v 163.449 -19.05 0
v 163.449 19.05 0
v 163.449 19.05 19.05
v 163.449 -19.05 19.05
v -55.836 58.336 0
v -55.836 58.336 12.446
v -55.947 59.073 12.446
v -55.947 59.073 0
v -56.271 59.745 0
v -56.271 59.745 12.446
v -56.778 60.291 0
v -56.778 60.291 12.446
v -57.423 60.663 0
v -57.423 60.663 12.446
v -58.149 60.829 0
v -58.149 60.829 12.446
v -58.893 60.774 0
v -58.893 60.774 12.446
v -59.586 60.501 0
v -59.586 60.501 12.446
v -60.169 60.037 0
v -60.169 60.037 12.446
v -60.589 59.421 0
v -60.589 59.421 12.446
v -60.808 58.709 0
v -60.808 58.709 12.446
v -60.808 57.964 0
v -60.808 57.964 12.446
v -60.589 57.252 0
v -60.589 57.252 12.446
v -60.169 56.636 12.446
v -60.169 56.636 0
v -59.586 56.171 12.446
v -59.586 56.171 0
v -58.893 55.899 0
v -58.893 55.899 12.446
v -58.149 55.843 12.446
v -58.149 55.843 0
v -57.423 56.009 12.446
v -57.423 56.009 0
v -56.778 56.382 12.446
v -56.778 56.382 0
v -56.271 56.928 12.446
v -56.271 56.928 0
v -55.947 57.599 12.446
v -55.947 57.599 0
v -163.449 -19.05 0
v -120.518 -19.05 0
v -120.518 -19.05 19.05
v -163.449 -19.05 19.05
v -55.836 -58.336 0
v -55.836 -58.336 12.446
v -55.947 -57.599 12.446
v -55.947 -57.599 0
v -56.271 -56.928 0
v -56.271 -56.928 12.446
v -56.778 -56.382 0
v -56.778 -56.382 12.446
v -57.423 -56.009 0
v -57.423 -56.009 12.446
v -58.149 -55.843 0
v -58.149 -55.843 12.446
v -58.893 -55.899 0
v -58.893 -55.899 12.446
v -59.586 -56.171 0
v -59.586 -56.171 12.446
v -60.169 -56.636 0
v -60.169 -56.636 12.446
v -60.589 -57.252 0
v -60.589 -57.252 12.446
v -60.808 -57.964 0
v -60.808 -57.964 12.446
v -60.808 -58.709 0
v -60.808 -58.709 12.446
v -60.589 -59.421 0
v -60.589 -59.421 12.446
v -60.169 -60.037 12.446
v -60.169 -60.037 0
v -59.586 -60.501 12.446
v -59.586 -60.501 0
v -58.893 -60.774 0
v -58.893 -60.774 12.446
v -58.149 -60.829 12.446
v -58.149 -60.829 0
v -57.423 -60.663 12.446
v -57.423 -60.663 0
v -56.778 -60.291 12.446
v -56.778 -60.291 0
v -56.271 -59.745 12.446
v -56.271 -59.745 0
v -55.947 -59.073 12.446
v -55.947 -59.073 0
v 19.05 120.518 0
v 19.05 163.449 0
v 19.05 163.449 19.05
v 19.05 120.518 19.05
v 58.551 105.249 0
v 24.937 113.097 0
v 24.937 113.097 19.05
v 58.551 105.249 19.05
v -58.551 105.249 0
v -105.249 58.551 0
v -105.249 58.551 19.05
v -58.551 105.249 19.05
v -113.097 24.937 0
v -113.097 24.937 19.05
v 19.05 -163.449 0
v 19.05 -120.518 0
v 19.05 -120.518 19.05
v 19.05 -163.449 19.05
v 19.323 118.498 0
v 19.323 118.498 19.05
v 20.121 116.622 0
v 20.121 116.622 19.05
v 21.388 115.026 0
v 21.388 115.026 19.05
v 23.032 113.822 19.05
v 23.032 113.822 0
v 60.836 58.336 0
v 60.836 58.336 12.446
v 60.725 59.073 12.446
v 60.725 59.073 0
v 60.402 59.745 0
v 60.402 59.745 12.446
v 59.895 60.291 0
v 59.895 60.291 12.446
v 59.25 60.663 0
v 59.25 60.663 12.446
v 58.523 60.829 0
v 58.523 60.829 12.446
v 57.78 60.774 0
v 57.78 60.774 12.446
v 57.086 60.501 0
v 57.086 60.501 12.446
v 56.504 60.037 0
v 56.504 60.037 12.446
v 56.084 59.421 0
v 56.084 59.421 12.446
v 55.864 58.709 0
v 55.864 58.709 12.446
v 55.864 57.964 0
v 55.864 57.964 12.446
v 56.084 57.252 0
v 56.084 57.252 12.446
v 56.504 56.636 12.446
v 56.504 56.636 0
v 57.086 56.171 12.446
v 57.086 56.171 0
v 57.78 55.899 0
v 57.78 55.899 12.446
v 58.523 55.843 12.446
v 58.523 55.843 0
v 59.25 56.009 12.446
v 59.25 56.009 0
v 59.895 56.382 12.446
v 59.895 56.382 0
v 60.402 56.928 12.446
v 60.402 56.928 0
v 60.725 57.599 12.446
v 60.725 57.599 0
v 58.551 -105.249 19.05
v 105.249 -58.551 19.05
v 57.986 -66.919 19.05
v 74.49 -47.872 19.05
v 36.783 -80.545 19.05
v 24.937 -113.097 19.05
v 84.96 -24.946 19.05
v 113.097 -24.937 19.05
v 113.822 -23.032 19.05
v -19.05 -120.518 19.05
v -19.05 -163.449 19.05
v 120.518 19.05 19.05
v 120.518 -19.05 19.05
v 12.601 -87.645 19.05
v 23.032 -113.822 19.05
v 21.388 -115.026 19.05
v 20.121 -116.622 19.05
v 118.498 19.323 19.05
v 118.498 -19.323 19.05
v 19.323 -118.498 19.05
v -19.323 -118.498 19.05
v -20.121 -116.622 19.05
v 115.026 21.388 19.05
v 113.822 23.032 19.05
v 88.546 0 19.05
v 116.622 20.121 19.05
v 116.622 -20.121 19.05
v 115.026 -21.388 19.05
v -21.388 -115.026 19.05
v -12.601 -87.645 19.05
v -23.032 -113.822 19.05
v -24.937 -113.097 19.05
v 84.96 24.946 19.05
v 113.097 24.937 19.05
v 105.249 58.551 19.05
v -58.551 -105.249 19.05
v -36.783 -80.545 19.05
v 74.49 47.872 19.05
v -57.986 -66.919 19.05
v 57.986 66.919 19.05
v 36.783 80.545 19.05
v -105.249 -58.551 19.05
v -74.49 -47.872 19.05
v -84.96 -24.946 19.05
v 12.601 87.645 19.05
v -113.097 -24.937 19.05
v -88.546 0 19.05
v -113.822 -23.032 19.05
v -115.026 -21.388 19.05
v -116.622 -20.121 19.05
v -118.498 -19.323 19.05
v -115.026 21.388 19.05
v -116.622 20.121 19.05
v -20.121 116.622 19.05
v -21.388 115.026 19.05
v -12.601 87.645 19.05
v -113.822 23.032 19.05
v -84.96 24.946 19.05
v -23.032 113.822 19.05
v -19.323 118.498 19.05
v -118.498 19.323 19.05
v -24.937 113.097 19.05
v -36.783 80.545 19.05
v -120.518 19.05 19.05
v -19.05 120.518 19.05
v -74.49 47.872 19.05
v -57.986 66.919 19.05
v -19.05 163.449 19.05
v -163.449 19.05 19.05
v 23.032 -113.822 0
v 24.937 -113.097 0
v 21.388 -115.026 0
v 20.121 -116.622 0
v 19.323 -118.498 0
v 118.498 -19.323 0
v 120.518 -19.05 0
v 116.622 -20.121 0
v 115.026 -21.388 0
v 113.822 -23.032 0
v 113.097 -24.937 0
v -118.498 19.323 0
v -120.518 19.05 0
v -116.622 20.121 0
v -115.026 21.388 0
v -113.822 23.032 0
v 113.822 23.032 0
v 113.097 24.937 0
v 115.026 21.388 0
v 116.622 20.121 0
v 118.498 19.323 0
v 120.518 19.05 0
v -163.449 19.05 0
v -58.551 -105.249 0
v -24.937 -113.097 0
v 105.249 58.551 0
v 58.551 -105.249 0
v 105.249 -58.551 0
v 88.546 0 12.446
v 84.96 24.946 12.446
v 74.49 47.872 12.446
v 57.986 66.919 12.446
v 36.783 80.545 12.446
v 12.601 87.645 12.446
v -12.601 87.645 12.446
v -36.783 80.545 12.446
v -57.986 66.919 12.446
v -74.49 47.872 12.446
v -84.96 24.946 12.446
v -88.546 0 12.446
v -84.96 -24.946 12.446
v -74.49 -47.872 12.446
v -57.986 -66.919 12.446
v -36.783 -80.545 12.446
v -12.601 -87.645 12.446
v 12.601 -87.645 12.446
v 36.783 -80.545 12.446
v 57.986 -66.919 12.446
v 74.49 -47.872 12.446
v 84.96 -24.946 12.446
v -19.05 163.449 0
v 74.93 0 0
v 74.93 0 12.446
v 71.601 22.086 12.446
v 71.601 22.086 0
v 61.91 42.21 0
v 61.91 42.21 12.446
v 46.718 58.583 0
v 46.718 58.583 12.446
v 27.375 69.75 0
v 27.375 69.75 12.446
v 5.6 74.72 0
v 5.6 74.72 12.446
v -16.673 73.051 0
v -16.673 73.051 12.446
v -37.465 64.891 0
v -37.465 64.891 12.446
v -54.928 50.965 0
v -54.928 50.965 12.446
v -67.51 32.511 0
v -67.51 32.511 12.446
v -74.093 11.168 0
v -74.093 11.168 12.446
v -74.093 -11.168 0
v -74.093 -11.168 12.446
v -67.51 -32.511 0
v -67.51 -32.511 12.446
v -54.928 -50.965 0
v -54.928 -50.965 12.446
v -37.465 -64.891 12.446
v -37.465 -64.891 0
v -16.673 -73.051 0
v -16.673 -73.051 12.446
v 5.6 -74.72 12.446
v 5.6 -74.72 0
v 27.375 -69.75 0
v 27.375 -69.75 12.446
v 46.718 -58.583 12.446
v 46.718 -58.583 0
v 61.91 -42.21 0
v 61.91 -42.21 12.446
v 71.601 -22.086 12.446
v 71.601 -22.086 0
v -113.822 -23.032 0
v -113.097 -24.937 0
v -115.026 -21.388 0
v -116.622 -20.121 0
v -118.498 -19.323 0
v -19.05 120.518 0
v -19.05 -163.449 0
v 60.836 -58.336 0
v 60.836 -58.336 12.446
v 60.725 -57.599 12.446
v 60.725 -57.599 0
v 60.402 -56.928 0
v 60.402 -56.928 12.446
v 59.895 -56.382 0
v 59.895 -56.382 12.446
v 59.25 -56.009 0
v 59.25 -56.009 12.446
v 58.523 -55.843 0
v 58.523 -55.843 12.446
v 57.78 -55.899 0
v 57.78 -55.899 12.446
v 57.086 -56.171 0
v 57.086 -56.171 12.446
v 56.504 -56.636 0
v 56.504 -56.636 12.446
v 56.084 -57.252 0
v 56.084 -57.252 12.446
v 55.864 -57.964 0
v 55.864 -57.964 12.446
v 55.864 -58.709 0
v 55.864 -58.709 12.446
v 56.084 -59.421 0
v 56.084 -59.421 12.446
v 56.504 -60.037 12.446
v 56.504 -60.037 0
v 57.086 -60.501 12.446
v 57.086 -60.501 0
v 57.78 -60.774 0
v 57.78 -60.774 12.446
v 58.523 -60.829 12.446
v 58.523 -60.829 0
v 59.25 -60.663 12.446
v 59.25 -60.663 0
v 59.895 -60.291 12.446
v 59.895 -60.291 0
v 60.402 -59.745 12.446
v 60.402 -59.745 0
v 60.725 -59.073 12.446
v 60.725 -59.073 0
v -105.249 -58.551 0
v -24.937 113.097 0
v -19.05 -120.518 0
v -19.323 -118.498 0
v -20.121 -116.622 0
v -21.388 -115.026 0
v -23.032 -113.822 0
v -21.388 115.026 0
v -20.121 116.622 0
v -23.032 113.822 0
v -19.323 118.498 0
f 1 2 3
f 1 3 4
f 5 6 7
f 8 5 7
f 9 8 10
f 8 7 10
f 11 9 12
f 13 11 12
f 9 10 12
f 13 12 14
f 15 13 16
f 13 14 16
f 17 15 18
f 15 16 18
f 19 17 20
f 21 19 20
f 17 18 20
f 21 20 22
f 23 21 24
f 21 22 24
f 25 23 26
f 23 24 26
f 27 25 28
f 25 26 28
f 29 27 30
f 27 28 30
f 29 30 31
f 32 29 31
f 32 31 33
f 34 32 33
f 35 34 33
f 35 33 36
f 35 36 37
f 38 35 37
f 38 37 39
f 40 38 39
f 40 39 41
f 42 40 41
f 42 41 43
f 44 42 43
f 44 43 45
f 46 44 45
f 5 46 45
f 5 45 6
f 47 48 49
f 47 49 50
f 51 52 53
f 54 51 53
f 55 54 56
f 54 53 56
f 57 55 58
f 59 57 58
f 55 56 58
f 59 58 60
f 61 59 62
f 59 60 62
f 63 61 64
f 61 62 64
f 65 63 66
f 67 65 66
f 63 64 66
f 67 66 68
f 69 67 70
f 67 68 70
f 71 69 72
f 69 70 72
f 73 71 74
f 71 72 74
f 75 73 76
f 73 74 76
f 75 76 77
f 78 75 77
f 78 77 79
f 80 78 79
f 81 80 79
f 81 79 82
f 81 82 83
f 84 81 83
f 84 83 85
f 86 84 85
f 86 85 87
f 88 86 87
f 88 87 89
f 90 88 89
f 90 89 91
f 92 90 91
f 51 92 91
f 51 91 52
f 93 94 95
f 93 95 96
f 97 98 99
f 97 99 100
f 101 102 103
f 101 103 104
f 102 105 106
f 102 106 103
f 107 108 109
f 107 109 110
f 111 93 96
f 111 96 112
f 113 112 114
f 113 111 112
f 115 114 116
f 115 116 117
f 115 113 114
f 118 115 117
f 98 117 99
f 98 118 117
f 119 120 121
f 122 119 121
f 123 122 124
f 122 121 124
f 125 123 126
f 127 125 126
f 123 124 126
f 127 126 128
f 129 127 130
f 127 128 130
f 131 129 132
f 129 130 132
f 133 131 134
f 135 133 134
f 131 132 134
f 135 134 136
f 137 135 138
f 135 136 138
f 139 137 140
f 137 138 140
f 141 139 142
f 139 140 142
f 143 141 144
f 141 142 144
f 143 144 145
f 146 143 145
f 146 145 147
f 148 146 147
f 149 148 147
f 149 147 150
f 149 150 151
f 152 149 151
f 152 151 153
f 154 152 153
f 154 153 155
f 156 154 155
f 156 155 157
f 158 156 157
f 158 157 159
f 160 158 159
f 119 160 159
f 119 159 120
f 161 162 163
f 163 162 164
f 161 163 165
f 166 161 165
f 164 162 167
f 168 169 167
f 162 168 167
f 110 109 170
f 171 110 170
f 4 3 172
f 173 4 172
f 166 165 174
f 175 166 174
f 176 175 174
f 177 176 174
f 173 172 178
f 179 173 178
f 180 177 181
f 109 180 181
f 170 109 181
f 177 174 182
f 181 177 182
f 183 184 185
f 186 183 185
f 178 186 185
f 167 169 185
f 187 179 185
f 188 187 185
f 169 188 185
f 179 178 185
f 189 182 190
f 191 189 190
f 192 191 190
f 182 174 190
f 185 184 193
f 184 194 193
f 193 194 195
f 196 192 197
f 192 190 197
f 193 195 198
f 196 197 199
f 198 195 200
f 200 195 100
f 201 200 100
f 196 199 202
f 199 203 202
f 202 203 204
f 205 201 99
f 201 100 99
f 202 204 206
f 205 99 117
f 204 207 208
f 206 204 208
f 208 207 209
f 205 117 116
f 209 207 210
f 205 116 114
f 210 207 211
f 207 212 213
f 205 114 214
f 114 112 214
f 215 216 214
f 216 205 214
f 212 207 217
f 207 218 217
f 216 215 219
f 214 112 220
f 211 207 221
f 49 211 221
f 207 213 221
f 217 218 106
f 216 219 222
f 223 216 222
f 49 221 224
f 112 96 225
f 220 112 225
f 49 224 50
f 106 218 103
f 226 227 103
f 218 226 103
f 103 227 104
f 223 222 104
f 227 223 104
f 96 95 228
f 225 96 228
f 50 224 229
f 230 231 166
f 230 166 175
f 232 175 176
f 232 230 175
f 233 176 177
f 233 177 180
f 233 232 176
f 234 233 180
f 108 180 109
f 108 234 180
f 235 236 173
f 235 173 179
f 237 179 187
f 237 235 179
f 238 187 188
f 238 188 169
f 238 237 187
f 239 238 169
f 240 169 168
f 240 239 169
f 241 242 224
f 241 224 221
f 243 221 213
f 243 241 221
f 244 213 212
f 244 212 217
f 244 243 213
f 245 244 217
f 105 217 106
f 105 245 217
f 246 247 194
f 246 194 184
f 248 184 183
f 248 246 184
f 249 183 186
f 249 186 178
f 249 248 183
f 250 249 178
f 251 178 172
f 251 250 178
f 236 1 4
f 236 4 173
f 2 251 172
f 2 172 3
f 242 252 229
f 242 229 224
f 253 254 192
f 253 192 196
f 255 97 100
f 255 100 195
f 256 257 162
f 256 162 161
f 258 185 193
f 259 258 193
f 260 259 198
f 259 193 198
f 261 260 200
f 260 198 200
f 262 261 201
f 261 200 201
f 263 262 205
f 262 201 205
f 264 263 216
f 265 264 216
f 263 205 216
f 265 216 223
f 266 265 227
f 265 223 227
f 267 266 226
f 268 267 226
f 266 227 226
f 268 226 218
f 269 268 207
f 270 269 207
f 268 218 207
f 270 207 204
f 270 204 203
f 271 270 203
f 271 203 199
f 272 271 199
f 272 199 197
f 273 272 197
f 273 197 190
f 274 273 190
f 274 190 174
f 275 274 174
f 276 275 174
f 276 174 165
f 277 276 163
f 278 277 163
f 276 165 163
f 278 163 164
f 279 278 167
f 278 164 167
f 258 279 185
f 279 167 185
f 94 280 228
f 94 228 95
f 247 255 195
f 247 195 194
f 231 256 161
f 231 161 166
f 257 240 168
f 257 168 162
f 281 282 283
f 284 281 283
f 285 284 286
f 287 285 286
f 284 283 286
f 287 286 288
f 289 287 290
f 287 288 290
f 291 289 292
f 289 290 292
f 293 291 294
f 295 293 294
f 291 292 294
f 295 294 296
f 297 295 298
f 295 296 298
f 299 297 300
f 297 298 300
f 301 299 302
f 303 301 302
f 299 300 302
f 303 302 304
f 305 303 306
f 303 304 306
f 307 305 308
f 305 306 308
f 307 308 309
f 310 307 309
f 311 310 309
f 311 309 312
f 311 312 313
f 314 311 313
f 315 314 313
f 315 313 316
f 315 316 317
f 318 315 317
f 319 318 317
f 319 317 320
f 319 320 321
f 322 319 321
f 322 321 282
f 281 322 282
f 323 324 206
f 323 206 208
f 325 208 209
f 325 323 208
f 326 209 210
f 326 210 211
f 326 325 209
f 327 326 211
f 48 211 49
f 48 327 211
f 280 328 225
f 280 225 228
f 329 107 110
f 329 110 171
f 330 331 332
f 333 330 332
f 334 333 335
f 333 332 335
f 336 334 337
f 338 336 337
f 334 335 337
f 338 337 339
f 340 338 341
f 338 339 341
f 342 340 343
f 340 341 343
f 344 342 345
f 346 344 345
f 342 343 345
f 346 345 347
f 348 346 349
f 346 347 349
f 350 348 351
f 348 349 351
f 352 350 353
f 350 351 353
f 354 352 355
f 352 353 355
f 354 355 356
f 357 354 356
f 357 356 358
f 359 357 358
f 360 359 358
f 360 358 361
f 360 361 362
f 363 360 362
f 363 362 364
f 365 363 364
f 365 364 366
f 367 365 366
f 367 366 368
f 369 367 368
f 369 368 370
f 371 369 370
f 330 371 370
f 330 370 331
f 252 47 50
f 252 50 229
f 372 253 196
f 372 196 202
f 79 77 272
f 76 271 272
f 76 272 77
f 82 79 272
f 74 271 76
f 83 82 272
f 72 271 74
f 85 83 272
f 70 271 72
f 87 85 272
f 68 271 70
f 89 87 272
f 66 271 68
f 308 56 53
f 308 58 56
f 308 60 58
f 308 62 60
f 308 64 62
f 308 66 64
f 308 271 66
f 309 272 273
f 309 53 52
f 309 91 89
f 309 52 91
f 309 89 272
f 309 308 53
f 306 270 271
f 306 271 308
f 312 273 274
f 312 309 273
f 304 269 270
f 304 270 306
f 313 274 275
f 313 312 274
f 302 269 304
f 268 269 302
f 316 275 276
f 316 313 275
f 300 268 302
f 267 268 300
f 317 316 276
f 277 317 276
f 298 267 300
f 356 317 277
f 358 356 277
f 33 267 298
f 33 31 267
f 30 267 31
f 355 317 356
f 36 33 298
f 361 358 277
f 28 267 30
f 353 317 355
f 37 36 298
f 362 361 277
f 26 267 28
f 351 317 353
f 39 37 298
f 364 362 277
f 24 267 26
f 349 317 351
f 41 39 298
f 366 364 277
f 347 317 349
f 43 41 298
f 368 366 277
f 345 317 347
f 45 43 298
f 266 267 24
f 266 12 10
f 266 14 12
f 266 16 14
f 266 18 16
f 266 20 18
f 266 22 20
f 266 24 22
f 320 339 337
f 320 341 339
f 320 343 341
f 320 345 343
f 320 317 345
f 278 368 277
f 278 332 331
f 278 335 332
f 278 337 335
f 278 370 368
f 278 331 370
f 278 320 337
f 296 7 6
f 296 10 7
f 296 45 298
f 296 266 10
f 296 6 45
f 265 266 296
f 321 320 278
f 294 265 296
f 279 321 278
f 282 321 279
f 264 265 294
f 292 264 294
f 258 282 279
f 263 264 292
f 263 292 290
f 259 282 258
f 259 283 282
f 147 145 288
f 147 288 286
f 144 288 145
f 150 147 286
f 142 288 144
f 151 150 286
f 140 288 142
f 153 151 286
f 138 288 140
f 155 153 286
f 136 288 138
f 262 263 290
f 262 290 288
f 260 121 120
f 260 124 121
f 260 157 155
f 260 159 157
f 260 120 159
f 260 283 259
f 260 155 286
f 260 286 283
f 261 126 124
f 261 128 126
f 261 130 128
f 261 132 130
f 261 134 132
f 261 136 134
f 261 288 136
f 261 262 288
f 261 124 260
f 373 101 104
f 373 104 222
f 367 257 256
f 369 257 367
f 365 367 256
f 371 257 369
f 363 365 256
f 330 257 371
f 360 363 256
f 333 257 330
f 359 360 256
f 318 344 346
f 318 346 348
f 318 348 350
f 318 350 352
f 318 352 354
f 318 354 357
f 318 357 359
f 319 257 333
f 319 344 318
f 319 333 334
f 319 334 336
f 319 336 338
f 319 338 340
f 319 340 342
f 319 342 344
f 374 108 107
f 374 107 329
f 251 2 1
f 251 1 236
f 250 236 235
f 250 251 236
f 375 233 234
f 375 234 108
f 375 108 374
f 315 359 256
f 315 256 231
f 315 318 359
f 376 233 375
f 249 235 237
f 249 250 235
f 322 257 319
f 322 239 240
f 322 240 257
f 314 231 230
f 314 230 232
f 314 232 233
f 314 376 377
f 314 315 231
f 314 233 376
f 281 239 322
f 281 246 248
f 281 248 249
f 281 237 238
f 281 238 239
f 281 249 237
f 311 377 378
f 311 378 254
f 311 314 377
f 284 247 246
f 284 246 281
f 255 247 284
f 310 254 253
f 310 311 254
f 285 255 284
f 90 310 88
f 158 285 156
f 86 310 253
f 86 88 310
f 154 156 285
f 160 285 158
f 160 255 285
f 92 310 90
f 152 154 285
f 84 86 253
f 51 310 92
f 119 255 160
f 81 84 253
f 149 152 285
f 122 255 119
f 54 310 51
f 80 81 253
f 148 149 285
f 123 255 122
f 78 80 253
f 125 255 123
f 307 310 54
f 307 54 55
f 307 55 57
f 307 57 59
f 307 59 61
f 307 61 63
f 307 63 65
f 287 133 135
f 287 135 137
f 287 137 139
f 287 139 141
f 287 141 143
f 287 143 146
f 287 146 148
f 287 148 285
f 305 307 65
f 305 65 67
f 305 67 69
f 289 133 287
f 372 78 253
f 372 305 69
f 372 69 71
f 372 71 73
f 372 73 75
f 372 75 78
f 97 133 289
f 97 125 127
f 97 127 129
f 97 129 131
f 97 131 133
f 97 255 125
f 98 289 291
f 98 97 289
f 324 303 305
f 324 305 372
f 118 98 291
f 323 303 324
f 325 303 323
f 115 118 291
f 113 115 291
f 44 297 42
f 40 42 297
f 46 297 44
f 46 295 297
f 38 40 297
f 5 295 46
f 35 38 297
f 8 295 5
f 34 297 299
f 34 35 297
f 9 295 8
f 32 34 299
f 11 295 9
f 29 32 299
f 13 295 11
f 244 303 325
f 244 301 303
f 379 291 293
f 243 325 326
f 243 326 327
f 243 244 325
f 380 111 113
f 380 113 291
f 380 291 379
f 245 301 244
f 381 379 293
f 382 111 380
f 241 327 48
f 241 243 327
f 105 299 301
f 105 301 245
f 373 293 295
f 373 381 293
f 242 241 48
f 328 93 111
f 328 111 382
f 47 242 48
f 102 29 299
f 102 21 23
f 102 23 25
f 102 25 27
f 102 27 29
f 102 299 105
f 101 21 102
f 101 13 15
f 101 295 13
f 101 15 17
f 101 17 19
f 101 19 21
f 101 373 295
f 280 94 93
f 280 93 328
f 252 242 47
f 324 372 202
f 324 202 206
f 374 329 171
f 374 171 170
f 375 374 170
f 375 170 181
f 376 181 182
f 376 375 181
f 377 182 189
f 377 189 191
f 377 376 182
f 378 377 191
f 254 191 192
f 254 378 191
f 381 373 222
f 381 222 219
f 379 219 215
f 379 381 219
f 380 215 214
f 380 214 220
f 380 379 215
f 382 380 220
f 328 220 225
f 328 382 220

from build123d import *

# Parameters (mm, degrees)
BOSS_EXTRUDE1_DEPTH = 19.05
SKETCH2_R           = 74.93
CUT_EXTRUDE1_DEPTH  = 232.935451585
SKETCH3_R           = 88.546370902
CUT_EXTRUDE2_DEPTH  = 6.604
SKETCH4_R           = 2.5
CUT_EXTRUDE3_DEPTH  = 232.486617579


with BuildPart() as part:
    # Sketch1 → Boss-Extrude1 (new body)
    with BuildSketch(Plane.XY):
        with BuildLine():
            Line((-19.05, 120.51752167), (-19.05, 163.449))
            Line((-19.05, 163.449), (19.05, 163.449))
            Line((19.05, 163.449), (19.05, 120.51752167))
            ThreePointArc((19.05, 120.51752167), (20.700629733, 115.781382038), (24.937406462, 113.097109308))
            Line((24.937406462, 113.097109308), (58.551269909, 105.248601739))
            Line((58.551269909, 105.248601739), (105.248601739, 58.551269909))
            Line((105.248601739, 58.551269909), (113.097109308, 24.937406462))
            ThreePointArc((113.097109308, 24.937406462), (115.781382038, 20.700629733), (120.51752167, 19.05))
            Line((120.51752167, 19.05), (163.449, 19.05))
            Line((163.449, 19.05), (163.449, -19.05))
            Line((163.449, -19.05), (120.51752167, -19.05))
            ThreePointArc((120.51752167, -19.05), (115.781382038, -20.700629733), (113.097109308, -24.937406462))
            Line((113.097109308, -24.937406462), (105.248601739, -58.551269909))
            Line((105.248601739, -58.551269909), (58.551269909, -105.248601739))
            Line((58.551269909, -105.248601739), (24.937406462, -113.097109308))
            ThreePointArc((24.937406462, -113.097109308), (20.700629733, -115.781382038), (19.05, -120.51752167))
            Line((19.05, -120.51752167), (19.05, -163.449))
            Line((19.05, -163.449), (-19.05, -163.449))
            Line((-19.05, -163.449), (-19.05, -120.51752167))
            ThreePointArc((-19.05, -120.51752167), (-20.700629733, -115.781382038), (-24.937406462, -113.097109308))
            Line((-24.937406462, -113.097109308), (-58.551269909, -105.248601739))
            Line((-58.551269909, -105.248601739), (-105.248601739, -58.551269909))
            Line((-105.248601739, -58.551269909), (-113.097109308, -24.937406462))
            ThreePointArc((-113.097109308, -24.937406462), (-115.781382038, -20.700629733), (-120.51752167, -19.05))
            Line((-120.51752167, -19.05), (-163.449, -19.05))
            Line((-163.449, -19.05), (-163.449, 19.05))
            Line((-163.449, 19.05), (-120.51752167, 19.05))
            ThreePointArc((-120.51752167, 19.05), (-115.781382038, 20.700629733), (-113.097109308, 24.937406462))
            Line((-113.097109308, 24.937406462), (-105.248601739, 58.551269909))
            Line((-105.248601739, 58.551269909), (-58.551269909, 105.248601739))
            Line((-58.551269909, 105.248601739), (-24.937406462, 113.097109308))
            ThreePointArc((-24.937406462, 113.097109308), (-20.700629733, 115.781382038), (-19.05, 120.51752167))
        make_face()
    extrude(amount=BOSS_EXTRUDE1_DEPTH)

    # Sketch2 → Cut-Extrude1 (cut, through all)
    with BuildSketch(Plane.XY.offset(19.05)):
        Circle(SKETCH2_R)
    extrude(amount=-CUT_EXTRUDE1_DEPTH, mode=Mode.SUBTRACT)

    # Sketch3 → Cut-Extrude2 (cut)
    with BuildSketch(Plane.XY.offset(19.05)):
        Circle(SKETCH3_R)
    extrude(amount=-CUT_EXTRUDE2_DEPTH, mode=Mode.SUBTRACT)

    # Sketch4 → Cut-Extrude3 (cut, through all)
    with BuildSketch(Plane.XY.offset(12.446)):
        with Locations((-58.336309448, 58.336309448)):
            Circle(SKETCH4_R)
        with Locations((58.336309448, 58.336309448)):
            Circle(SKETCH4_R)
        with Locations((58.336309448, -58.336309448)):
            Circle(SKETCH4_R)
        with Locations((-58.336309448, -58.336309448)):
            Circle(SKETCH4_R)
    extrude(amount=-CUT_EXTRUDE3_DEPTH, mode=Mode.SUBTRACT)


solid = part.part
